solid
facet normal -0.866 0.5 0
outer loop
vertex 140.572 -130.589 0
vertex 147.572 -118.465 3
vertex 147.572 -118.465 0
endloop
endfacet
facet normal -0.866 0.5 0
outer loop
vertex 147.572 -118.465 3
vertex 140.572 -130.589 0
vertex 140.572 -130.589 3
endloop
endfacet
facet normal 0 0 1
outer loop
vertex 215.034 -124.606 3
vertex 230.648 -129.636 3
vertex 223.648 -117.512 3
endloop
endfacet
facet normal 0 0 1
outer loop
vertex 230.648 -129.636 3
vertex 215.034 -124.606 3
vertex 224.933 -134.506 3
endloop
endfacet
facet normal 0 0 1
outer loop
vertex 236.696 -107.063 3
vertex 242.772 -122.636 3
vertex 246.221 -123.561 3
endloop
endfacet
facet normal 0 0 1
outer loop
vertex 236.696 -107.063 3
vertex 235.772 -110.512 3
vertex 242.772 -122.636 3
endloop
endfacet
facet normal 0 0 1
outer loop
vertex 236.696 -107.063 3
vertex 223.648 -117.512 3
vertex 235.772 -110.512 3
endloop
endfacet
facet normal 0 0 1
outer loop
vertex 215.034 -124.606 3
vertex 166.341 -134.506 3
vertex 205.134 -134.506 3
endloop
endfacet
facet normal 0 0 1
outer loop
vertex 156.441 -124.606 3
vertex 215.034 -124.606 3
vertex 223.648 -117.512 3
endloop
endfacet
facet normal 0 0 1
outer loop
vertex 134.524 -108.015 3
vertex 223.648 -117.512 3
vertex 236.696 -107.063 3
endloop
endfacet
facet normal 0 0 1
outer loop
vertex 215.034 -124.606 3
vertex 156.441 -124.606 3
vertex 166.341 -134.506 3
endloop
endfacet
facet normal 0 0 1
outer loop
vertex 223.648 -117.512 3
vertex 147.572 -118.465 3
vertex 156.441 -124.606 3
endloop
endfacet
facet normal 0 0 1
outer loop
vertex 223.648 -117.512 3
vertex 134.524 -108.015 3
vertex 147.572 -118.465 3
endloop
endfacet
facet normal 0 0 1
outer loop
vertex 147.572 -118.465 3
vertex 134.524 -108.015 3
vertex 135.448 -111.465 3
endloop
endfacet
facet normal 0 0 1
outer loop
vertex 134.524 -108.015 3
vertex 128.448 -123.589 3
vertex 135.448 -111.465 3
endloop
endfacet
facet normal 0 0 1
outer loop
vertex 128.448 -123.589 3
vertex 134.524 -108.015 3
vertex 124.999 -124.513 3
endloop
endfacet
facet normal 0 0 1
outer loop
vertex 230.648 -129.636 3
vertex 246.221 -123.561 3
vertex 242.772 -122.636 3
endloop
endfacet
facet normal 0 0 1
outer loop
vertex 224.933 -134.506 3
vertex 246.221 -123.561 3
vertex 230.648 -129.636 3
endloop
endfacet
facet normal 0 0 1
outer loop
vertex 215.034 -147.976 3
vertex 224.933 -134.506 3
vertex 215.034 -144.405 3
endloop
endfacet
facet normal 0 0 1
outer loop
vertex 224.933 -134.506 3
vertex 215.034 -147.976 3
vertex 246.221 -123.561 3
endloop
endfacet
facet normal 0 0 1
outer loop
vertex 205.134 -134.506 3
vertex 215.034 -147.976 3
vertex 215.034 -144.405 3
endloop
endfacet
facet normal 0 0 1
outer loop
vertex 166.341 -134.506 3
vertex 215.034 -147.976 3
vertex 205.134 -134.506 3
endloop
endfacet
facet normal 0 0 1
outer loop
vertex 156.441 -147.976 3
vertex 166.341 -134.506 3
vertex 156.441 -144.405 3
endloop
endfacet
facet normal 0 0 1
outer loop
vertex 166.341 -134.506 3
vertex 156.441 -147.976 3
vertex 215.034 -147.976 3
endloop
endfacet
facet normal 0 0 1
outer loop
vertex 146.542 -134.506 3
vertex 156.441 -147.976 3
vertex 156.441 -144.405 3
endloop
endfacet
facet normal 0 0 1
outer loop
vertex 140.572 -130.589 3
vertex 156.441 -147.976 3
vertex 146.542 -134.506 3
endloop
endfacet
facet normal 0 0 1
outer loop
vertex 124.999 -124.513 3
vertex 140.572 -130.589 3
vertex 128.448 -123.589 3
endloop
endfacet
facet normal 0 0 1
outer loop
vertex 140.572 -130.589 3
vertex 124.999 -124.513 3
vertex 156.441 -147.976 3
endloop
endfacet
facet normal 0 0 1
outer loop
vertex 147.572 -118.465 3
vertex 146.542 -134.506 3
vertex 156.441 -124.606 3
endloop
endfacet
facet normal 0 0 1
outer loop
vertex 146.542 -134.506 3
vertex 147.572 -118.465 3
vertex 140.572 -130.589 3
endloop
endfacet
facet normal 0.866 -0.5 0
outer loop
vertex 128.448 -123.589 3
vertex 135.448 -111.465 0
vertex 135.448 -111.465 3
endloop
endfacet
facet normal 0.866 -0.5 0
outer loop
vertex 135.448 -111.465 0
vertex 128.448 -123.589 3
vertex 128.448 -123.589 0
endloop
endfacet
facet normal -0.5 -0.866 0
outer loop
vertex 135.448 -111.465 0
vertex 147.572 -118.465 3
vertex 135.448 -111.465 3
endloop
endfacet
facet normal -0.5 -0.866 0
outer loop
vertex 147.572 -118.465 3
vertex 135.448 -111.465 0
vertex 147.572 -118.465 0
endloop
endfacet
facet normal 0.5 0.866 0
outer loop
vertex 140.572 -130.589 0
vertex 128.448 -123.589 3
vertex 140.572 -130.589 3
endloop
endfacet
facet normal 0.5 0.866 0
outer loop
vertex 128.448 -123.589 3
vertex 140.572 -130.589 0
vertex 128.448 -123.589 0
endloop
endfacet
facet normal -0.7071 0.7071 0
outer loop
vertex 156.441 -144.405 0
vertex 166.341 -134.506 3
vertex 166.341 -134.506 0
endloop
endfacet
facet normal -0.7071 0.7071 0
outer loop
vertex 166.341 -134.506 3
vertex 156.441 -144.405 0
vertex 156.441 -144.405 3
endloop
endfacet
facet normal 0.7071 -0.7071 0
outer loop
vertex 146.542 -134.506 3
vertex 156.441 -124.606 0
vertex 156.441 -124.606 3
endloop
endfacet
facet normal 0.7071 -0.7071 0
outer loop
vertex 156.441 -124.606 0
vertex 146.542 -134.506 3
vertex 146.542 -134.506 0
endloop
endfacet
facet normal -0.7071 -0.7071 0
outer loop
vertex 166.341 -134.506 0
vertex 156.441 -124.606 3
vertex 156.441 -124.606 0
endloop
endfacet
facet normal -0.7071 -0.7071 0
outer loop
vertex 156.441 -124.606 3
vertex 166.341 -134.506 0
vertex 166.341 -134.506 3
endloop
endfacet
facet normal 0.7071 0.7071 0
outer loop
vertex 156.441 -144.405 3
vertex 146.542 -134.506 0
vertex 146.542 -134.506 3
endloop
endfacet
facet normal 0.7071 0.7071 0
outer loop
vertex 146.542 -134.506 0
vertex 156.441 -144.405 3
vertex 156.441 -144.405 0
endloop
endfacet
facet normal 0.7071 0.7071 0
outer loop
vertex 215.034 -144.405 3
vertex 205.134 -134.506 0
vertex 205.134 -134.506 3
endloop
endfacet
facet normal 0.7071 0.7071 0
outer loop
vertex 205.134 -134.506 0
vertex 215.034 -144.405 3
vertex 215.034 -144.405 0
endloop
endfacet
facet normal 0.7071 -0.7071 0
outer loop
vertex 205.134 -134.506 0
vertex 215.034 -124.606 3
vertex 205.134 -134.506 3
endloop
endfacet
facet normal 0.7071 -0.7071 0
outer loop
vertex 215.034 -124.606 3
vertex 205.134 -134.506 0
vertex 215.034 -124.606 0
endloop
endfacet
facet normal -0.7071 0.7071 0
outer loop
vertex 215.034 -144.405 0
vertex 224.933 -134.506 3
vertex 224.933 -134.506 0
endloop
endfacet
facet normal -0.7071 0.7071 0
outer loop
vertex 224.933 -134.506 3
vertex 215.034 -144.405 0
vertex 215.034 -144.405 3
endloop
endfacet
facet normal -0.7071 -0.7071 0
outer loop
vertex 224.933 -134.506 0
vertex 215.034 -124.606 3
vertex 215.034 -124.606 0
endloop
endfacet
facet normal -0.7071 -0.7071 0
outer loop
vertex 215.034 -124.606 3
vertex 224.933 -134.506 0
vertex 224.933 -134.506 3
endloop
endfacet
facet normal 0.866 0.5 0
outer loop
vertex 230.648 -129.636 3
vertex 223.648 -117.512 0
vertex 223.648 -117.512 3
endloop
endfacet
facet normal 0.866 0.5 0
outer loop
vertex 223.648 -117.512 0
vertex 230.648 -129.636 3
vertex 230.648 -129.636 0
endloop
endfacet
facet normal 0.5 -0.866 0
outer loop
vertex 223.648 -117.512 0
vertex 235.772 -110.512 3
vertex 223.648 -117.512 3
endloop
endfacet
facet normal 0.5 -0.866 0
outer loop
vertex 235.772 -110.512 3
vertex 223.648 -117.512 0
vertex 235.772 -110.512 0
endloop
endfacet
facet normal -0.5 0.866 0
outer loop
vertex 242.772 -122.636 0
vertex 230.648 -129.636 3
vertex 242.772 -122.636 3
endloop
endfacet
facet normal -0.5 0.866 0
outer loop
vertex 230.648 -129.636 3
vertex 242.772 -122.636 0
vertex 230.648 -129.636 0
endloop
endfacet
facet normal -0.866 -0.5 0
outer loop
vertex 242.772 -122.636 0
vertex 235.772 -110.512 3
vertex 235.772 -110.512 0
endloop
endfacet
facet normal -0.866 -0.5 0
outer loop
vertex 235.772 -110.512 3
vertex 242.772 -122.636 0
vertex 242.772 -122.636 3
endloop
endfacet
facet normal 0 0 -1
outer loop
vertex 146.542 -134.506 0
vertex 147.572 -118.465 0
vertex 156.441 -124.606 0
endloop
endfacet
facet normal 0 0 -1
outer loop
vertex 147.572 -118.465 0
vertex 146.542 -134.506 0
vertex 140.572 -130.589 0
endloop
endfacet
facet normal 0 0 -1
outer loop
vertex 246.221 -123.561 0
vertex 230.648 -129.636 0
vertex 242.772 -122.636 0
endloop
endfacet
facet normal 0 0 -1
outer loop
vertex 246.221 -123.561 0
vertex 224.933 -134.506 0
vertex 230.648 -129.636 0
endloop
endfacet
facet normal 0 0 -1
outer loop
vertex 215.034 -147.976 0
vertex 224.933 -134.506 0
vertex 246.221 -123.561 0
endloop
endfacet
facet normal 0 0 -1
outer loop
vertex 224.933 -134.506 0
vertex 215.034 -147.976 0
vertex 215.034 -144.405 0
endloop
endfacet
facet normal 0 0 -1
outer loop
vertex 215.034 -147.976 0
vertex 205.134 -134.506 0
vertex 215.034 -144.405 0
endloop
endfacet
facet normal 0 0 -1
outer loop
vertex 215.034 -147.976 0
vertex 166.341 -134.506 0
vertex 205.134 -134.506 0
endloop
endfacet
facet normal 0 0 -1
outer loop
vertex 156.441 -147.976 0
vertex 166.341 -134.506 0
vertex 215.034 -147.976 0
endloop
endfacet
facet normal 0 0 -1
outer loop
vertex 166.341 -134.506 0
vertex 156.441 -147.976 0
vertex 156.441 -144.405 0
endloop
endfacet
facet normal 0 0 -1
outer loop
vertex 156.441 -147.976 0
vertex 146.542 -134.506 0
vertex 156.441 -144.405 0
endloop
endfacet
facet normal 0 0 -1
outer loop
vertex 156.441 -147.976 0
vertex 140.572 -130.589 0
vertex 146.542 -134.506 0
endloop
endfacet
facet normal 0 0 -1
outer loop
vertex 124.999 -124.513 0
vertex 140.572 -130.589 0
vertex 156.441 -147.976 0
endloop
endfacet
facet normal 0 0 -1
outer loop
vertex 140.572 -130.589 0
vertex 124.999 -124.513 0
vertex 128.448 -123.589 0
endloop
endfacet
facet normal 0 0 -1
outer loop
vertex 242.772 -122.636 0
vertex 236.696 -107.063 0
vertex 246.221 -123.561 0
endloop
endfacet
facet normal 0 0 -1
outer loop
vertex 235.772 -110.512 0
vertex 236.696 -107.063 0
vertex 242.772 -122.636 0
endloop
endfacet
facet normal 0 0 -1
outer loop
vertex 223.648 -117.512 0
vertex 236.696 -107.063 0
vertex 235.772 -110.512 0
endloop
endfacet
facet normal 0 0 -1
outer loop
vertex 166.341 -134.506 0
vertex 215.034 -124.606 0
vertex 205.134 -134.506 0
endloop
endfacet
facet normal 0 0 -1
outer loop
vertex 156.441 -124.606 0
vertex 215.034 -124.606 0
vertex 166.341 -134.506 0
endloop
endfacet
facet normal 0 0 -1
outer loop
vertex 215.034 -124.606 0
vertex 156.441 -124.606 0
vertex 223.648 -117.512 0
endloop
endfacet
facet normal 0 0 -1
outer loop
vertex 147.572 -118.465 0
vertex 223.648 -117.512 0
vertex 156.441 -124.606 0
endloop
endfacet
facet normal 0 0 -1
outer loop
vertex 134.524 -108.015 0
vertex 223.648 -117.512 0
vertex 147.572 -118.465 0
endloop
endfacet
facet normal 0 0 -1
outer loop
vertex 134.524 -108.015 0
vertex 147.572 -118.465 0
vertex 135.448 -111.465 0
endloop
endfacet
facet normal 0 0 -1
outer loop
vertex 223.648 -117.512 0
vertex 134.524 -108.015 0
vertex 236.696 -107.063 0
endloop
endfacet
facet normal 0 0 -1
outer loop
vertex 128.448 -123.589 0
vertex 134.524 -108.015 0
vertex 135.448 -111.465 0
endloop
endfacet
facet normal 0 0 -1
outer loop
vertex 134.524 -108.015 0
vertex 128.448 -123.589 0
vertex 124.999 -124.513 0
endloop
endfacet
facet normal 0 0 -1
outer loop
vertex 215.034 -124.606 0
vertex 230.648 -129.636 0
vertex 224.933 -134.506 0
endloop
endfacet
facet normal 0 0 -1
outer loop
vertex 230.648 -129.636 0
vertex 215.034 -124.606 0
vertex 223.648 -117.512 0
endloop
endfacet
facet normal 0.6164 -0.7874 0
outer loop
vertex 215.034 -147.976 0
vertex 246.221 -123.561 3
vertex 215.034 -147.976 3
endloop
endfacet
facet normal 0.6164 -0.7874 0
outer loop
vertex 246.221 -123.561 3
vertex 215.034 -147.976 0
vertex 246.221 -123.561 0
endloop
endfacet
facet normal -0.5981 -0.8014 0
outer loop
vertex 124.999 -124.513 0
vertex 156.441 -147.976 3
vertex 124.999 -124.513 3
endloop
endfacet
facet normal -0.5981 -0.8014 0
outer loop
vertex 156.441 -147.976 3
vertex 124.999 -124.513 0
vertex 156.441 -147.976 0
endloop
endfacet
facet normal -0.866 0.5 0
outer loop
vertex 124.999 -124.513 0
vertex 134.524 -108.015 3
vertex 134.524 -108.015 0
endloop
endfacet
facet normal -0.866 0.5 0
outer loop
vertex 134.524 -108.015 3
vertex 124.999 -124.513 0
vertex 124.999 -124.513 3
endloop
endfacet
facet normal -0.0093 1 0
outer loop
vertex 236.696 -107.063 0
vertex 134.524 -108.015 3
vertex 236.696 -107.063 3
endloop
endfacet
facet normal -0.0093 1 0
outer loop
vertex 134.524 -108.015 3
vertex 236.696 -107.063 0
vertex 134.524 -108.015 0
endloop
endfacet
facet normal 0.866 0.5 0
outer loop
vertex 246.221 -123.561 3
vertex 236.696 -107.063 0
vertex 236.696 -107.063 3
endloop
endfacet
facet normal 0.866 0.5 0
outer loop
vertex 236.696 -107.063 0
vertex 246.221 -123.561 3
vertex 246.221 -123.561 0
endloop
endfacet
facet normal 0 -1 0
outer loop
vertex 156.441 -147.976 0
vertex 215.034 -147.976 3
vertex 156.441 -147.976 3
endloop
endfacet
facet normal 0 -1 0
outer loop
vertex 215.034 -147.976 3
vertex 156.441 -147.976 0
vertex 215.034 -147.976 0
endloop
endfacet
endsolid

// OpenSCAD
// Generated by SolidPython 1.1.3 on 2026-11-13 12:41:32
$fn = $preview ? 0 : 100;


difference(){
	difference() {
		union() {
			linear_extrude(height = 3) {
				polygon(points = [[215.0338847455189, -147.97596045400934], [156.44111525448116, -147.9759604540093], [124.99852839420937, -124.5131163507795], [134.5235283942094, -108.01533240868596], [236.69625, -107.06283240868598], [246.22125, -123.56061635077954], [215.0338847455189, -147.97596045400934]]);
			}
		}
	}
	/* Holes Below*/
	union(){
		translate(v = [138.0099203653, -121.0267243797, 0]) {
			rotate(a = -30) {
				cube(center = true, size = [14, 14, 6]);
			}
		}
		translate(v = [156.4411152545, -134.5055762724, 0]) {
			rotate(a = -45) {
				cube(center = true, size = [14, 14, 6]);
			}
		}
		translate(v = [215.0338847455, -134.5055762724, 0]) {
			rotate(a = 45) {
				cube(center = true, size = [14, 14, 6]);
			}
		}
		translate(v = [233.2098580290, -120.0742243797, 0]) {
			rotate(a = 30) {
				cube(center = true, size = [14, 14, 6]);
			}
		}
	} /* End Holes */ 
}
/***********************************************
*********      SolidPython code:      **********
************************************************
 
# SPDX-FileCopyrightText: 2025 adamws <adamws@users.noreply.github.com>
#
# SPDX-License-Identifier: GPL-3.0-or-later

import argparse
import shutil
import sys
from enum import Enum
from pathlib import Path
from typing import List

import shapely
from shapely import MultiPoint, affinity, centroid, envelope
from solid import (
    OpenSCADObject,
    cube,
    hole,
    linear_extrude,
    polygon,
    rotate,
    scad_render_to_file,
    translate,
    union,
)

from kbplacer.kle_serial import (
    Keyboard,
    MatrixAnnotatedKeyboard,
    get_keyboard_from_file,
)


class PlateShape(str, Enum):
    ENVELOPE = "envelope"  # minimum bounding box that encloses switches
    CONVEX_HULL = "convex_hull"  # minimum convex geometry that encloses switches


def _get_cube(rotation, x, y, z):
    c = cube((x, y, z), center=True)
    if rotation == 0:
        return c
    else:
        return rotate(rotation)(c)


def generate(
    keyboard: Keyboard,
    *,
    dx: float = 19.05,
    dy: float = 19.05,
    cutout_size=14.0,
    cutout_outline_thickness=0,
    plate_thickness=3,
    margin: float = 0,
    shape: PlateShape = PlateShape.ENVELOPE,
    outline_ignore: List[int] = [],
    align_origin=False,
    ignore_alternative=False,
) -> OpenSCADObject:
    # for keeping track of switches polygons in order to calculate plate shape later
    # normally would include all switch polygons but could be filtered
    outline_switches = []

    holes = []

    cutout_outline_width = 2.0
    add_hole_outline = cutout_outline_thickness != 0
    holes_outlines = []

    if isinstance(keyboard, MatrixAnnotatedKeyboard):
        keys = keyboard.keys_in_matrix_order()
        if ignore_alternative:
            keys = [
                k for k in keys if MatrixAnnotatedKeyboard.get_layout_option(k) == 0
            ]
    else:
        keys = keyboard.keys
        keys = sorted(keys, key=lambda k: [k.y, k.x])

    offset = None
    for i, k in enumerate(keys):
        if k.decal:
            continue
        p = shapely.box(k.x, -k.y, k.x + k.width, -k.y - k.height)
        # keycap outline includes second rectangle of non-rectangular keys,
        # e.g. lower part of stepped keys, switch is centered on the first one
        x2, y2 = k.x + k.x2, k.y + k.y2
        keycap = p.union(shapely.box(x2, -y2, x2 + k.width2, -y2 - k.height2))

        rotation = {"angle": -k.rotation_angle, "origin": (k.rotation_x, -k.rotation_y)}
        p = affinity.rotate(p, **rotation)
        keycap = affinity.rotate(keycap, **rotation)

        # if align option enabled then use center of first switch as reference point (0, 0)
        if align_origin:
            if offset == None:
                offset = centroid(p)
            p = affinity.translate(p, -offset.x, -offset.y, 0)
            keycap = affinity.translate(keycap, -offset.x, -offset.y, 0)

        if i not in outline_ignore:
            outline_switches.append(keycap)

        # get switch center and create cube hole based on it
        c = centroid(p)

        plate_hole = translate((dx * c.x, dy * c.y, 0))(
            _get_cube(
                -k.rotation_angle,
                cutout_size,
                cutout_size,
                2 * (plate_thickness + cutout_outline_thickness),
            )
        )
        holes.append(plate_hole)
        if add_hole_outline:
            size = cutout_size + cutout_outline_width
            hole_outline = translate((dx * c.x, dy * c.y, plate_thickness))(
                _get_cube(-k.rotation_angle, size, size, cutout_outline_thickness)
            )
            holes_outlines.append(hole_outline)

    points = []
    for poly in outline_switches:
        for c in poly.exterior.coords:
            points.append((c[0] * dx, c[1] * dy))

    if shape == PlateShape.ENVELOPE:
        plate_polygon = envelope(MultiPoint(points))
    else:  # PlateShape.CONVEX_HULL:
        plate_polygon = MultiPoint(points).convex_hull

    if margin:
        plate_polygon = plate_polygon.buffer(margin)

    _, coords, _ = shapely.to_ragged_array([plate_polygon])
    plate = linear_extrude(height=plate_thickness)(polygon(coords))

    plate_and_hole_outlines = union()(plate, *holes_outlines)
    result = plate_and_hole_outlines - hole()(*holes)
    return result


def load_keyboard(layout_path) -> Keyboard:
    _keyboard = get_keyboard_from_file(layout_path)
    try:
        _keyboard = MatrixAnnotatedKeyboard.from_keyboard(_keyboard)
        _keyboard.collapse()
    except Exception:
        pass

    return _keyboard


if __name__ == "__main__":
    parser = argparse.ArgumentParser(description="Keyboard layout file to OpenSCAD")
    parser.add_argument("-i", "--in", required=True, help="Layout file")
    parser.add_argument("-o", "--out", required=True, help="Output path")
    parser.add_argument(
        "-f",
        "--force",
        action="store_true",
        help="Override output if already exists",
    )
    parser.add_argument(
        "--margin",
        type=float,
        required=False,
        default=0.0,
        help="Margin too add (in mm)",
    )
    parser.add_argument(
        "--shape",
        type=PlateShape,
        choices=list(PlateShape),
        required=False,
        default=PlateShape.ENVELOPE,
        help="Plate shape",
    )
    parser.add_argument(
        "--key-distance-x",
        type=float,
        required=False,
        default=19.05,
        help=("1U distance in mm between two keys in X direction, 19.05 by default"),
    )
    parser.add_argument(
        "--key-distance-y",
        type=float,
        required=False,
        default=19.05,
        help=("1U distance in mm between two keys in Y direction, 19.05 by default"),
    )
    parser.add_argument(
        "--cutout-size",
        type=float,
        required=False,
        default=14,
        help=("Size of switch cutout, 14 by default"),
    )
    parser.add_argument(
        "--cutout-outline-thickness",
        type=float,
        required=False,
        default=0,
        help=("Thickness for per-key outline, for prototyping"),
    )
    parser.add_argument(
        "--plate-thickness",
        type=float,
        required=False,
        default=3,
        help=("Plate thickness in mm, 3 by default"),
    )
    parser.add_argument(
        "--align-origin",
        action="store_true",
        help=("Place first layout switch at (0,0,0)"),
    )
    parser.add_argument(
        "--ignore-alternative-layouts",
        action="store_true",
        help=("Ignore alternative layout keys"),
    )
    parser.add_argument(
        "--outline-ignore-keys",
        required=False,
        default="",
        help=(
            "Comma separated list of key indexes to ignore when calculating plate shape"
        ),
    )

    args = parser.parse_args()
    input_path = getattr(args, "in")
    output_path = getattr(args, "out")
    force = args.force

    if force:
        shutil.rmtree(output_path, ignore_errors=True)
    elif Path(output_path).is_file():
        print(
            f"Output file '{output_path}' already exists, exiting...", file=sys.stderr
        )
        sys.exit(1)

    outline_ignore = []
    if args.outline_ignore_keys:
        outline_ignore = [int(val) for val in args.outline_ignore_keys.split(",")]

    keyboard = load_keyboard(input_path)
    args = {
        "dx": args.key_distance_x,
        "dy": args.key_distance_y,
        "cutout_size": args.cutout_size,
        "cutout_outline_thickness": args.cutout_outline_thickness,
        "plate_thickness": args.plate_thickness,
        "margin": args.margin,
        "shape": args.shape,
        "outline_ignore": outline_ignore,
        "align_origin": args.align_origin,
        "ignore_alternative": args.ignore_alternative_layouts,
    }
    result = generate(keyboard, **args)

    scad_render_to_file(result, output_path, file_header="$fn = $preview ? 0 : 100;")
 
 
************************************************/
